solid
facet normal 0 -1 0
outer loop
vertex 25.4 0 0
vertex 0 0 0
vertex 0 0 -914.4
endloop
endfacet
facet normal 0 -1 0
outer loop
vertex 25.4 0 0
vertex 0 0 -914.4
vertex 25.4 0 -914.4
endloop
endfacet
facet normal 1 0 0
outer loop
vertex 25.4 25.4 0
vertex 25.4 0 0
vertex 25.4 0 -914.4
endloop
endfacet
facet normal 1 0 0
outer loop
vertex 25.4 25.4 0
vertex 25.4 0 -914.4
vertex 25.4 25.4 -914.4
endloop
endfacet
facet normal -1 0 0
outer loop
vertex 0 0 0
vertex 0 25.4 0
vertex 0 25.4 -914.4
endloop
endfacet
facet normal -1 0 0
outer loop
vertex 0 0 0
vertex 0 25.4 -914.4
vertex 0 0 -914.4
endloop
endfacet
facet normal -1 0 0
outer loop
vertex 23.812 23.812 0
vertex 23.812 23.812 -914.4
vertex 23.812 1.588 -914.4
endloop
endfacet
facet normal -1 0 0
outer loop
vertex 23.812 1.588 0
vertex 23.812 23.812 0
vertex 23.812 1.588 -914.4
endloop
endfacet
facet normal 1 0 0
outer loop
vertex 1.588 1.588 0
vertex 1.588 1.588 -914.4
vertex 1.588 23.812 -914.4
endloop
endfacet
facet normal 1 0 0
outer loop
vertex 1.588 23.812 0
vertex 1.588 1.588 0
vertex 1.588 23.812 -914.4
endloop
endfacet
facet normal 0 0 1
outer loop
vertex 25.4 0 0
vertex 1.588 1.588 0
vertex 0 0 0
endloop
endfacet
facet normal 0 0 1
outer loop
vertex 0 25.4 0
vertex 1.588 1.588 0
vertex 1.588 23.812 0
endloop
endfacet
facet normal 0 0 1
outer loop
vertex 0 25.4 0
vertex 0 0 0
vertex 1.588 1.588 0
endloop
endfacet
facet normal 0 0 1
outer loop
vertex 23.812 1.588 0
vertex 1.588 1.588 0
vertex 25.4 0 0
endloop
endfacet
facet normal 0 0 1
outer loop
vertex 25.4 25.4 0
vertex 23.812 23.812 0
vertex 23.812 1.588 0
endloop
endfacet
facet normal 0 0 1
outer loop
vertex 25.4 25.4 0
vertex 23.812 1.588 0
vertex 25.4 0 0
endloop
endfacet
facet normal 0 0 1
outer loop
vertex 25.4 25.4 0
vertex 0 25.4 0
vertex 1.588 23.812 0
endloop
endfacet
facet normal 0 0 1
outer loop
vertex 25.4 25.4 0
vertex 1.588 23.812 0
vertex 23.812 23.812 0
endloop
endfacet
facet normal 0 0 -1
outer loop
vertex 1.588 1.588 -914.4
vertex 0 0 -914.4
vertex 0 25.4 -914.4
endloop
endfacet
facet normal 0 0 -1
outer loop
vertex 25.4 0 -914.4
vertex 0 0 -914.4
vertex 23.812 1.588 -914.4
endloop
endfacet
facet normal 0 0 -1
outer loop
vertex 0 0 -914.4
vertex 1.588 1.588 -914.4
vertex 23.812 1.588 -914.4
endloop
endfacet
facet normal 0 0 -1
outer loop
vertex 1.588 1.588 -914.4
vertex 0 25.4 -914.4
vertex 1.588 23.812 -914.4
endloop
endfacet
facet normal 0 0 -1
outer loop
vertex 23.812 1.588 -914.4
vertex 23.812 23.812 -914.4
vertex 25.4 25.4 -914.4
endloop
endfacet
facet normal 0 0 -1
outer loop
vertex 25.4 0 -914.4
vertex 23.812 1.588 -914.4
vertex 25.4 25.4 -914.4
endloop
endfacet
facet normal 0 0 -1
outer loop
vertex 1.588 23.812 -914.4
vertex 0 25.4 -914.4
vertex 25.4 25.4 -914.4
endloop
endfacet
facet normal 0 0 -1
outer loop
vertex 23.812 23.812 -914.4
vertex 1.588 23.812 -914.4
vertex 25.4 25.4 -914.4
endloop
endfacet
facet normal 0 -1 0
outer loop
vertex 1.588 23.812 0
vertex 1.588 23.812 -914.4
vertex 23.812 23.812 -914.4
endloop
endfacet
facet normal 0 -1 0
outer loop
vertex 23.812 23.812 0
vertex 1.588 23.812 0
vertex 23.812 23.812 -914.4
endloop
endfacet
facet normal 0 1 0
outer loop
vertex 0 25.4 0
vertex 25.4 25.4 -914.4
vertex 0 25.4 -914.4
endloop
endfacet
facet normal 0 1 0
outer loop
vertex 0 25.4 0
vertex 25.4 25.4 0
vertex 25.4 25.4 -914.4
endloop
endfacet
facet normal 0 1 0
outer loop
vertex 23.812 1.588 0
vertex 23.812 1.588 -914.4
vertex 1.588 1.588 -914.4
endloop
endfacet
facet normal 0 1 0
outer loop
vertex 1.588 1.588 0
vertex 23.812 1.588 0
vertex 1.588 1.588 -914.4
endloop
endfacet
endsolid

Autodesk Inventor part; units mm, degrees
ref_plane "YZ Plane" through (0, 0, 0) normal (1, 0, 0) x (0, 1, 0)
ref_plane "XZ Plane" through (0, 0, 0) normal (0, 1, 0) x (-1, 0, 0)
ref_plane "XY Plane" through (0, 0, 0) normal (0, 0, 1) x (1, 0, 0)
sketch "Sketch1" plane through (0, 0, 0) normal (0, 0, 1) x (1, 0, 0)
  line L0 (0, 0) -> (25.4, 0)
  line L1 (25.4, 0) -> (25.4, 25.4)
  line L2 (25.4, 25.4) -> (0, 25.4)
  line L3 (0, 25.4) -> (0, 0)
  line L4 (1.5875, 23.8125) -> (23.8125, 23.8125)
  line L5 (23.8125, 23.8125) -> (23.8125, 1.5875)
  line L6 (23.8125, 1.5875) -> (1.5875, 1.5875)
  line L7 (1.5875, 1.5875) -> (1.5875, 23.8125)
  dimension "d0" = 25.4
  dimension "d1" = 25.4
  dimension "d2" = 1.5875
extrude "Extrusion1" add sketch "Sketch1" against normal blind 914.4
properties part number "1tube_36_frame"
